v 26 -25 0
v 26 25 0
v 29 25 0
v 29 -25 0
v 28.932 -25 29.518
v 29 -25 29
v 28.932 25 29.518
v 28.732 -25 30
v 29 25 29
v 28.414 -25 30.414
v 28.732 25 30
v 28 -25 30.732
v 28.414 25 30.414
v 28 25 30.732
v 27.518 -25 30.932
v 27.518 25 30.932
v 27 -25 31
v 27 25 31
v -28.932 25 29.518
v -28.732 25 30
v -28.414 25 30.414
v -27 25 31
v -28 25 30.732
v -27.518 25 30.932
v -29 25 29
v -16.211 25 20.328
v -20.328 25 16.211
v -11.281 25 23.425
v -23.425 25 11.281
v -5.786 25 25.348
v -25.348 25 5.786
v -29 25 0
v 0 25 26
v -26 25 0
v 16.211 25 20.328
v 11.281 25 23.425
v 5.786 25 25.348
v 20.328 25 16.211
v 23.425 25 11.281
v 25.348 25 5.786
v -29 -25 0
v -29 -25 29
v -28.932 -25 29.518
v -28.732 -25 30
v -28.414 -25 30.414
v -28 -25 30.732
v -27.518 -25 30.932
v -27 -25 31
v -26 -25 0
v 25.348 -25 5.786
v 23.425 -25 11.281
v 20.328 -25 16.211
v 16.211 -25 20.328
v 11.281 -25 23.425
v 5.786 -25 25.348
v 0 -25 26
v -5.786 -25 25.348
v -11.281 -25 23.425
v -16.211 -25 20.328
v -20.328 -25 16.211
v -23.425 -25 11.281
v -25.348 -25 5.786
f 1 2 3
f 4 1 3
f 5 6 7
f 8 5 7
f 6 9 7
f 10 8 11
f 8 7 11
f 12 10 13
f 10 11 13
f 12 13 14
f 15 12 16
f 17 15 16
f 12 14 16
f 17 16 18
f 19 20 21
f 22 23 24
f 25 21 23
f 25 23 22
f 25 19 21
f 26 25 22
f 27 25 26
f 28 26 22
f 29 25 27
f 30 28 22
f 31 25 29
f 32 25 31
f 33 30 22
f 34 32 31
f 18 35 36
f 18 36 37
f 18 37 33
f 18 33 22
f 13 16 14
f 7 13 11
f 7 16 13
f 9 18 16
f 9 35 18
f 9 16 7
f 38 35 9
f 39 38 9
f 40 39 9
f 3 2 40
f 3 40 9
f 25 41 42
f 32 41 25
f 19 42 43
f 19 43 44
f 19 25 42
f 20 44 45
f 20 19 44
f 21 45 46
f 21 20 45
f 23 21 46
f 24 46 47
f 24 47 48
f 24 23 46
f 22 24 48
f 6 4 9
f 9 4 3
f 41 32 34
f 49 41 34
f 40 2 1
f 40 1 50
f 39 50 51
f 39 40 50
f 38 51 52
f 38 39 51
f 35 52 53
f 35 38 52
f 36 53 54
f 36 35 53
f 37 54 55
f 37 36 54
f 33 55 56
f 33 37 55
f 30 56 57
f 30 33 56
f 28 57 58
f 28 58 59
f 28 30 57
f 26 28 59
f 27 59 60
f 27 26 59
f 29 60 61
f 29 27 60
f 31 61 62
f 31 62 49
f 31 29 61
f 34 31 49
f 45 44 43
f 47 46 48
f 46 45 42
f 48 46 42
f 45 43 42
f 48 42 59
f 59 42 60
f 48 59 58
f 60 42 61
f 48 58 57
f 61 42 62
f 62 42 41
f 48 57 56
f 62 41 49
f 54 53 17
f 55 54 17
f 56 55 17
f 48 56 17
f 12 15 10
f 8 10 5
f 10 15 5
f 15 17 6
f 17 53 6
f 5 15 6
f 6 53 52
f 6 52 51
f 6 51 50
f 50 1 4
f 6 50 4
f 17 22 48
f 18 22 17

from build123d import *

# Parameters (mm, degrees)
CYLINDER_R     = 26
CYLINDER_DEPTH = 50
BOX_W          = 58
BOX_H          = 50
BOX_DEPTH      = 31
FILLET_R       = 2


with BuildPart() as cylinder:
    # Cylinder → Cylinder (new body)
    with BuildSketch(Plane.XZ.offset(-25)):
        Circle(CYLINDER_R)
    extrude(amount=CYLINDER_DEPTH)


with BuildPart() as skalka_holder:
    # Box → Box (new body)
    with BuildSketch(Plane(origin=(-29, -25, 0), x_dir=(1, 0, 0), z_dir=(0, 0, 1))):
        with Locations((29, 25)):
            Rectangle(BOX_W, BOX_H)
    extrude(amount=BOX_DEPTH)

    # Fillet
    fillet_edges = [skalka_holder.edges().sort_by_distance(p)[0] for p in [
        (-29, 0, 31),
        (29, 0, 31),
    ]]
    fillet(fillet_edges, radius=FILLET_R)

    # Cut: cut Cylinder
    add(cylinder.part, mode=Mode.SUBTRACT)


solid = skalka_holder.part
